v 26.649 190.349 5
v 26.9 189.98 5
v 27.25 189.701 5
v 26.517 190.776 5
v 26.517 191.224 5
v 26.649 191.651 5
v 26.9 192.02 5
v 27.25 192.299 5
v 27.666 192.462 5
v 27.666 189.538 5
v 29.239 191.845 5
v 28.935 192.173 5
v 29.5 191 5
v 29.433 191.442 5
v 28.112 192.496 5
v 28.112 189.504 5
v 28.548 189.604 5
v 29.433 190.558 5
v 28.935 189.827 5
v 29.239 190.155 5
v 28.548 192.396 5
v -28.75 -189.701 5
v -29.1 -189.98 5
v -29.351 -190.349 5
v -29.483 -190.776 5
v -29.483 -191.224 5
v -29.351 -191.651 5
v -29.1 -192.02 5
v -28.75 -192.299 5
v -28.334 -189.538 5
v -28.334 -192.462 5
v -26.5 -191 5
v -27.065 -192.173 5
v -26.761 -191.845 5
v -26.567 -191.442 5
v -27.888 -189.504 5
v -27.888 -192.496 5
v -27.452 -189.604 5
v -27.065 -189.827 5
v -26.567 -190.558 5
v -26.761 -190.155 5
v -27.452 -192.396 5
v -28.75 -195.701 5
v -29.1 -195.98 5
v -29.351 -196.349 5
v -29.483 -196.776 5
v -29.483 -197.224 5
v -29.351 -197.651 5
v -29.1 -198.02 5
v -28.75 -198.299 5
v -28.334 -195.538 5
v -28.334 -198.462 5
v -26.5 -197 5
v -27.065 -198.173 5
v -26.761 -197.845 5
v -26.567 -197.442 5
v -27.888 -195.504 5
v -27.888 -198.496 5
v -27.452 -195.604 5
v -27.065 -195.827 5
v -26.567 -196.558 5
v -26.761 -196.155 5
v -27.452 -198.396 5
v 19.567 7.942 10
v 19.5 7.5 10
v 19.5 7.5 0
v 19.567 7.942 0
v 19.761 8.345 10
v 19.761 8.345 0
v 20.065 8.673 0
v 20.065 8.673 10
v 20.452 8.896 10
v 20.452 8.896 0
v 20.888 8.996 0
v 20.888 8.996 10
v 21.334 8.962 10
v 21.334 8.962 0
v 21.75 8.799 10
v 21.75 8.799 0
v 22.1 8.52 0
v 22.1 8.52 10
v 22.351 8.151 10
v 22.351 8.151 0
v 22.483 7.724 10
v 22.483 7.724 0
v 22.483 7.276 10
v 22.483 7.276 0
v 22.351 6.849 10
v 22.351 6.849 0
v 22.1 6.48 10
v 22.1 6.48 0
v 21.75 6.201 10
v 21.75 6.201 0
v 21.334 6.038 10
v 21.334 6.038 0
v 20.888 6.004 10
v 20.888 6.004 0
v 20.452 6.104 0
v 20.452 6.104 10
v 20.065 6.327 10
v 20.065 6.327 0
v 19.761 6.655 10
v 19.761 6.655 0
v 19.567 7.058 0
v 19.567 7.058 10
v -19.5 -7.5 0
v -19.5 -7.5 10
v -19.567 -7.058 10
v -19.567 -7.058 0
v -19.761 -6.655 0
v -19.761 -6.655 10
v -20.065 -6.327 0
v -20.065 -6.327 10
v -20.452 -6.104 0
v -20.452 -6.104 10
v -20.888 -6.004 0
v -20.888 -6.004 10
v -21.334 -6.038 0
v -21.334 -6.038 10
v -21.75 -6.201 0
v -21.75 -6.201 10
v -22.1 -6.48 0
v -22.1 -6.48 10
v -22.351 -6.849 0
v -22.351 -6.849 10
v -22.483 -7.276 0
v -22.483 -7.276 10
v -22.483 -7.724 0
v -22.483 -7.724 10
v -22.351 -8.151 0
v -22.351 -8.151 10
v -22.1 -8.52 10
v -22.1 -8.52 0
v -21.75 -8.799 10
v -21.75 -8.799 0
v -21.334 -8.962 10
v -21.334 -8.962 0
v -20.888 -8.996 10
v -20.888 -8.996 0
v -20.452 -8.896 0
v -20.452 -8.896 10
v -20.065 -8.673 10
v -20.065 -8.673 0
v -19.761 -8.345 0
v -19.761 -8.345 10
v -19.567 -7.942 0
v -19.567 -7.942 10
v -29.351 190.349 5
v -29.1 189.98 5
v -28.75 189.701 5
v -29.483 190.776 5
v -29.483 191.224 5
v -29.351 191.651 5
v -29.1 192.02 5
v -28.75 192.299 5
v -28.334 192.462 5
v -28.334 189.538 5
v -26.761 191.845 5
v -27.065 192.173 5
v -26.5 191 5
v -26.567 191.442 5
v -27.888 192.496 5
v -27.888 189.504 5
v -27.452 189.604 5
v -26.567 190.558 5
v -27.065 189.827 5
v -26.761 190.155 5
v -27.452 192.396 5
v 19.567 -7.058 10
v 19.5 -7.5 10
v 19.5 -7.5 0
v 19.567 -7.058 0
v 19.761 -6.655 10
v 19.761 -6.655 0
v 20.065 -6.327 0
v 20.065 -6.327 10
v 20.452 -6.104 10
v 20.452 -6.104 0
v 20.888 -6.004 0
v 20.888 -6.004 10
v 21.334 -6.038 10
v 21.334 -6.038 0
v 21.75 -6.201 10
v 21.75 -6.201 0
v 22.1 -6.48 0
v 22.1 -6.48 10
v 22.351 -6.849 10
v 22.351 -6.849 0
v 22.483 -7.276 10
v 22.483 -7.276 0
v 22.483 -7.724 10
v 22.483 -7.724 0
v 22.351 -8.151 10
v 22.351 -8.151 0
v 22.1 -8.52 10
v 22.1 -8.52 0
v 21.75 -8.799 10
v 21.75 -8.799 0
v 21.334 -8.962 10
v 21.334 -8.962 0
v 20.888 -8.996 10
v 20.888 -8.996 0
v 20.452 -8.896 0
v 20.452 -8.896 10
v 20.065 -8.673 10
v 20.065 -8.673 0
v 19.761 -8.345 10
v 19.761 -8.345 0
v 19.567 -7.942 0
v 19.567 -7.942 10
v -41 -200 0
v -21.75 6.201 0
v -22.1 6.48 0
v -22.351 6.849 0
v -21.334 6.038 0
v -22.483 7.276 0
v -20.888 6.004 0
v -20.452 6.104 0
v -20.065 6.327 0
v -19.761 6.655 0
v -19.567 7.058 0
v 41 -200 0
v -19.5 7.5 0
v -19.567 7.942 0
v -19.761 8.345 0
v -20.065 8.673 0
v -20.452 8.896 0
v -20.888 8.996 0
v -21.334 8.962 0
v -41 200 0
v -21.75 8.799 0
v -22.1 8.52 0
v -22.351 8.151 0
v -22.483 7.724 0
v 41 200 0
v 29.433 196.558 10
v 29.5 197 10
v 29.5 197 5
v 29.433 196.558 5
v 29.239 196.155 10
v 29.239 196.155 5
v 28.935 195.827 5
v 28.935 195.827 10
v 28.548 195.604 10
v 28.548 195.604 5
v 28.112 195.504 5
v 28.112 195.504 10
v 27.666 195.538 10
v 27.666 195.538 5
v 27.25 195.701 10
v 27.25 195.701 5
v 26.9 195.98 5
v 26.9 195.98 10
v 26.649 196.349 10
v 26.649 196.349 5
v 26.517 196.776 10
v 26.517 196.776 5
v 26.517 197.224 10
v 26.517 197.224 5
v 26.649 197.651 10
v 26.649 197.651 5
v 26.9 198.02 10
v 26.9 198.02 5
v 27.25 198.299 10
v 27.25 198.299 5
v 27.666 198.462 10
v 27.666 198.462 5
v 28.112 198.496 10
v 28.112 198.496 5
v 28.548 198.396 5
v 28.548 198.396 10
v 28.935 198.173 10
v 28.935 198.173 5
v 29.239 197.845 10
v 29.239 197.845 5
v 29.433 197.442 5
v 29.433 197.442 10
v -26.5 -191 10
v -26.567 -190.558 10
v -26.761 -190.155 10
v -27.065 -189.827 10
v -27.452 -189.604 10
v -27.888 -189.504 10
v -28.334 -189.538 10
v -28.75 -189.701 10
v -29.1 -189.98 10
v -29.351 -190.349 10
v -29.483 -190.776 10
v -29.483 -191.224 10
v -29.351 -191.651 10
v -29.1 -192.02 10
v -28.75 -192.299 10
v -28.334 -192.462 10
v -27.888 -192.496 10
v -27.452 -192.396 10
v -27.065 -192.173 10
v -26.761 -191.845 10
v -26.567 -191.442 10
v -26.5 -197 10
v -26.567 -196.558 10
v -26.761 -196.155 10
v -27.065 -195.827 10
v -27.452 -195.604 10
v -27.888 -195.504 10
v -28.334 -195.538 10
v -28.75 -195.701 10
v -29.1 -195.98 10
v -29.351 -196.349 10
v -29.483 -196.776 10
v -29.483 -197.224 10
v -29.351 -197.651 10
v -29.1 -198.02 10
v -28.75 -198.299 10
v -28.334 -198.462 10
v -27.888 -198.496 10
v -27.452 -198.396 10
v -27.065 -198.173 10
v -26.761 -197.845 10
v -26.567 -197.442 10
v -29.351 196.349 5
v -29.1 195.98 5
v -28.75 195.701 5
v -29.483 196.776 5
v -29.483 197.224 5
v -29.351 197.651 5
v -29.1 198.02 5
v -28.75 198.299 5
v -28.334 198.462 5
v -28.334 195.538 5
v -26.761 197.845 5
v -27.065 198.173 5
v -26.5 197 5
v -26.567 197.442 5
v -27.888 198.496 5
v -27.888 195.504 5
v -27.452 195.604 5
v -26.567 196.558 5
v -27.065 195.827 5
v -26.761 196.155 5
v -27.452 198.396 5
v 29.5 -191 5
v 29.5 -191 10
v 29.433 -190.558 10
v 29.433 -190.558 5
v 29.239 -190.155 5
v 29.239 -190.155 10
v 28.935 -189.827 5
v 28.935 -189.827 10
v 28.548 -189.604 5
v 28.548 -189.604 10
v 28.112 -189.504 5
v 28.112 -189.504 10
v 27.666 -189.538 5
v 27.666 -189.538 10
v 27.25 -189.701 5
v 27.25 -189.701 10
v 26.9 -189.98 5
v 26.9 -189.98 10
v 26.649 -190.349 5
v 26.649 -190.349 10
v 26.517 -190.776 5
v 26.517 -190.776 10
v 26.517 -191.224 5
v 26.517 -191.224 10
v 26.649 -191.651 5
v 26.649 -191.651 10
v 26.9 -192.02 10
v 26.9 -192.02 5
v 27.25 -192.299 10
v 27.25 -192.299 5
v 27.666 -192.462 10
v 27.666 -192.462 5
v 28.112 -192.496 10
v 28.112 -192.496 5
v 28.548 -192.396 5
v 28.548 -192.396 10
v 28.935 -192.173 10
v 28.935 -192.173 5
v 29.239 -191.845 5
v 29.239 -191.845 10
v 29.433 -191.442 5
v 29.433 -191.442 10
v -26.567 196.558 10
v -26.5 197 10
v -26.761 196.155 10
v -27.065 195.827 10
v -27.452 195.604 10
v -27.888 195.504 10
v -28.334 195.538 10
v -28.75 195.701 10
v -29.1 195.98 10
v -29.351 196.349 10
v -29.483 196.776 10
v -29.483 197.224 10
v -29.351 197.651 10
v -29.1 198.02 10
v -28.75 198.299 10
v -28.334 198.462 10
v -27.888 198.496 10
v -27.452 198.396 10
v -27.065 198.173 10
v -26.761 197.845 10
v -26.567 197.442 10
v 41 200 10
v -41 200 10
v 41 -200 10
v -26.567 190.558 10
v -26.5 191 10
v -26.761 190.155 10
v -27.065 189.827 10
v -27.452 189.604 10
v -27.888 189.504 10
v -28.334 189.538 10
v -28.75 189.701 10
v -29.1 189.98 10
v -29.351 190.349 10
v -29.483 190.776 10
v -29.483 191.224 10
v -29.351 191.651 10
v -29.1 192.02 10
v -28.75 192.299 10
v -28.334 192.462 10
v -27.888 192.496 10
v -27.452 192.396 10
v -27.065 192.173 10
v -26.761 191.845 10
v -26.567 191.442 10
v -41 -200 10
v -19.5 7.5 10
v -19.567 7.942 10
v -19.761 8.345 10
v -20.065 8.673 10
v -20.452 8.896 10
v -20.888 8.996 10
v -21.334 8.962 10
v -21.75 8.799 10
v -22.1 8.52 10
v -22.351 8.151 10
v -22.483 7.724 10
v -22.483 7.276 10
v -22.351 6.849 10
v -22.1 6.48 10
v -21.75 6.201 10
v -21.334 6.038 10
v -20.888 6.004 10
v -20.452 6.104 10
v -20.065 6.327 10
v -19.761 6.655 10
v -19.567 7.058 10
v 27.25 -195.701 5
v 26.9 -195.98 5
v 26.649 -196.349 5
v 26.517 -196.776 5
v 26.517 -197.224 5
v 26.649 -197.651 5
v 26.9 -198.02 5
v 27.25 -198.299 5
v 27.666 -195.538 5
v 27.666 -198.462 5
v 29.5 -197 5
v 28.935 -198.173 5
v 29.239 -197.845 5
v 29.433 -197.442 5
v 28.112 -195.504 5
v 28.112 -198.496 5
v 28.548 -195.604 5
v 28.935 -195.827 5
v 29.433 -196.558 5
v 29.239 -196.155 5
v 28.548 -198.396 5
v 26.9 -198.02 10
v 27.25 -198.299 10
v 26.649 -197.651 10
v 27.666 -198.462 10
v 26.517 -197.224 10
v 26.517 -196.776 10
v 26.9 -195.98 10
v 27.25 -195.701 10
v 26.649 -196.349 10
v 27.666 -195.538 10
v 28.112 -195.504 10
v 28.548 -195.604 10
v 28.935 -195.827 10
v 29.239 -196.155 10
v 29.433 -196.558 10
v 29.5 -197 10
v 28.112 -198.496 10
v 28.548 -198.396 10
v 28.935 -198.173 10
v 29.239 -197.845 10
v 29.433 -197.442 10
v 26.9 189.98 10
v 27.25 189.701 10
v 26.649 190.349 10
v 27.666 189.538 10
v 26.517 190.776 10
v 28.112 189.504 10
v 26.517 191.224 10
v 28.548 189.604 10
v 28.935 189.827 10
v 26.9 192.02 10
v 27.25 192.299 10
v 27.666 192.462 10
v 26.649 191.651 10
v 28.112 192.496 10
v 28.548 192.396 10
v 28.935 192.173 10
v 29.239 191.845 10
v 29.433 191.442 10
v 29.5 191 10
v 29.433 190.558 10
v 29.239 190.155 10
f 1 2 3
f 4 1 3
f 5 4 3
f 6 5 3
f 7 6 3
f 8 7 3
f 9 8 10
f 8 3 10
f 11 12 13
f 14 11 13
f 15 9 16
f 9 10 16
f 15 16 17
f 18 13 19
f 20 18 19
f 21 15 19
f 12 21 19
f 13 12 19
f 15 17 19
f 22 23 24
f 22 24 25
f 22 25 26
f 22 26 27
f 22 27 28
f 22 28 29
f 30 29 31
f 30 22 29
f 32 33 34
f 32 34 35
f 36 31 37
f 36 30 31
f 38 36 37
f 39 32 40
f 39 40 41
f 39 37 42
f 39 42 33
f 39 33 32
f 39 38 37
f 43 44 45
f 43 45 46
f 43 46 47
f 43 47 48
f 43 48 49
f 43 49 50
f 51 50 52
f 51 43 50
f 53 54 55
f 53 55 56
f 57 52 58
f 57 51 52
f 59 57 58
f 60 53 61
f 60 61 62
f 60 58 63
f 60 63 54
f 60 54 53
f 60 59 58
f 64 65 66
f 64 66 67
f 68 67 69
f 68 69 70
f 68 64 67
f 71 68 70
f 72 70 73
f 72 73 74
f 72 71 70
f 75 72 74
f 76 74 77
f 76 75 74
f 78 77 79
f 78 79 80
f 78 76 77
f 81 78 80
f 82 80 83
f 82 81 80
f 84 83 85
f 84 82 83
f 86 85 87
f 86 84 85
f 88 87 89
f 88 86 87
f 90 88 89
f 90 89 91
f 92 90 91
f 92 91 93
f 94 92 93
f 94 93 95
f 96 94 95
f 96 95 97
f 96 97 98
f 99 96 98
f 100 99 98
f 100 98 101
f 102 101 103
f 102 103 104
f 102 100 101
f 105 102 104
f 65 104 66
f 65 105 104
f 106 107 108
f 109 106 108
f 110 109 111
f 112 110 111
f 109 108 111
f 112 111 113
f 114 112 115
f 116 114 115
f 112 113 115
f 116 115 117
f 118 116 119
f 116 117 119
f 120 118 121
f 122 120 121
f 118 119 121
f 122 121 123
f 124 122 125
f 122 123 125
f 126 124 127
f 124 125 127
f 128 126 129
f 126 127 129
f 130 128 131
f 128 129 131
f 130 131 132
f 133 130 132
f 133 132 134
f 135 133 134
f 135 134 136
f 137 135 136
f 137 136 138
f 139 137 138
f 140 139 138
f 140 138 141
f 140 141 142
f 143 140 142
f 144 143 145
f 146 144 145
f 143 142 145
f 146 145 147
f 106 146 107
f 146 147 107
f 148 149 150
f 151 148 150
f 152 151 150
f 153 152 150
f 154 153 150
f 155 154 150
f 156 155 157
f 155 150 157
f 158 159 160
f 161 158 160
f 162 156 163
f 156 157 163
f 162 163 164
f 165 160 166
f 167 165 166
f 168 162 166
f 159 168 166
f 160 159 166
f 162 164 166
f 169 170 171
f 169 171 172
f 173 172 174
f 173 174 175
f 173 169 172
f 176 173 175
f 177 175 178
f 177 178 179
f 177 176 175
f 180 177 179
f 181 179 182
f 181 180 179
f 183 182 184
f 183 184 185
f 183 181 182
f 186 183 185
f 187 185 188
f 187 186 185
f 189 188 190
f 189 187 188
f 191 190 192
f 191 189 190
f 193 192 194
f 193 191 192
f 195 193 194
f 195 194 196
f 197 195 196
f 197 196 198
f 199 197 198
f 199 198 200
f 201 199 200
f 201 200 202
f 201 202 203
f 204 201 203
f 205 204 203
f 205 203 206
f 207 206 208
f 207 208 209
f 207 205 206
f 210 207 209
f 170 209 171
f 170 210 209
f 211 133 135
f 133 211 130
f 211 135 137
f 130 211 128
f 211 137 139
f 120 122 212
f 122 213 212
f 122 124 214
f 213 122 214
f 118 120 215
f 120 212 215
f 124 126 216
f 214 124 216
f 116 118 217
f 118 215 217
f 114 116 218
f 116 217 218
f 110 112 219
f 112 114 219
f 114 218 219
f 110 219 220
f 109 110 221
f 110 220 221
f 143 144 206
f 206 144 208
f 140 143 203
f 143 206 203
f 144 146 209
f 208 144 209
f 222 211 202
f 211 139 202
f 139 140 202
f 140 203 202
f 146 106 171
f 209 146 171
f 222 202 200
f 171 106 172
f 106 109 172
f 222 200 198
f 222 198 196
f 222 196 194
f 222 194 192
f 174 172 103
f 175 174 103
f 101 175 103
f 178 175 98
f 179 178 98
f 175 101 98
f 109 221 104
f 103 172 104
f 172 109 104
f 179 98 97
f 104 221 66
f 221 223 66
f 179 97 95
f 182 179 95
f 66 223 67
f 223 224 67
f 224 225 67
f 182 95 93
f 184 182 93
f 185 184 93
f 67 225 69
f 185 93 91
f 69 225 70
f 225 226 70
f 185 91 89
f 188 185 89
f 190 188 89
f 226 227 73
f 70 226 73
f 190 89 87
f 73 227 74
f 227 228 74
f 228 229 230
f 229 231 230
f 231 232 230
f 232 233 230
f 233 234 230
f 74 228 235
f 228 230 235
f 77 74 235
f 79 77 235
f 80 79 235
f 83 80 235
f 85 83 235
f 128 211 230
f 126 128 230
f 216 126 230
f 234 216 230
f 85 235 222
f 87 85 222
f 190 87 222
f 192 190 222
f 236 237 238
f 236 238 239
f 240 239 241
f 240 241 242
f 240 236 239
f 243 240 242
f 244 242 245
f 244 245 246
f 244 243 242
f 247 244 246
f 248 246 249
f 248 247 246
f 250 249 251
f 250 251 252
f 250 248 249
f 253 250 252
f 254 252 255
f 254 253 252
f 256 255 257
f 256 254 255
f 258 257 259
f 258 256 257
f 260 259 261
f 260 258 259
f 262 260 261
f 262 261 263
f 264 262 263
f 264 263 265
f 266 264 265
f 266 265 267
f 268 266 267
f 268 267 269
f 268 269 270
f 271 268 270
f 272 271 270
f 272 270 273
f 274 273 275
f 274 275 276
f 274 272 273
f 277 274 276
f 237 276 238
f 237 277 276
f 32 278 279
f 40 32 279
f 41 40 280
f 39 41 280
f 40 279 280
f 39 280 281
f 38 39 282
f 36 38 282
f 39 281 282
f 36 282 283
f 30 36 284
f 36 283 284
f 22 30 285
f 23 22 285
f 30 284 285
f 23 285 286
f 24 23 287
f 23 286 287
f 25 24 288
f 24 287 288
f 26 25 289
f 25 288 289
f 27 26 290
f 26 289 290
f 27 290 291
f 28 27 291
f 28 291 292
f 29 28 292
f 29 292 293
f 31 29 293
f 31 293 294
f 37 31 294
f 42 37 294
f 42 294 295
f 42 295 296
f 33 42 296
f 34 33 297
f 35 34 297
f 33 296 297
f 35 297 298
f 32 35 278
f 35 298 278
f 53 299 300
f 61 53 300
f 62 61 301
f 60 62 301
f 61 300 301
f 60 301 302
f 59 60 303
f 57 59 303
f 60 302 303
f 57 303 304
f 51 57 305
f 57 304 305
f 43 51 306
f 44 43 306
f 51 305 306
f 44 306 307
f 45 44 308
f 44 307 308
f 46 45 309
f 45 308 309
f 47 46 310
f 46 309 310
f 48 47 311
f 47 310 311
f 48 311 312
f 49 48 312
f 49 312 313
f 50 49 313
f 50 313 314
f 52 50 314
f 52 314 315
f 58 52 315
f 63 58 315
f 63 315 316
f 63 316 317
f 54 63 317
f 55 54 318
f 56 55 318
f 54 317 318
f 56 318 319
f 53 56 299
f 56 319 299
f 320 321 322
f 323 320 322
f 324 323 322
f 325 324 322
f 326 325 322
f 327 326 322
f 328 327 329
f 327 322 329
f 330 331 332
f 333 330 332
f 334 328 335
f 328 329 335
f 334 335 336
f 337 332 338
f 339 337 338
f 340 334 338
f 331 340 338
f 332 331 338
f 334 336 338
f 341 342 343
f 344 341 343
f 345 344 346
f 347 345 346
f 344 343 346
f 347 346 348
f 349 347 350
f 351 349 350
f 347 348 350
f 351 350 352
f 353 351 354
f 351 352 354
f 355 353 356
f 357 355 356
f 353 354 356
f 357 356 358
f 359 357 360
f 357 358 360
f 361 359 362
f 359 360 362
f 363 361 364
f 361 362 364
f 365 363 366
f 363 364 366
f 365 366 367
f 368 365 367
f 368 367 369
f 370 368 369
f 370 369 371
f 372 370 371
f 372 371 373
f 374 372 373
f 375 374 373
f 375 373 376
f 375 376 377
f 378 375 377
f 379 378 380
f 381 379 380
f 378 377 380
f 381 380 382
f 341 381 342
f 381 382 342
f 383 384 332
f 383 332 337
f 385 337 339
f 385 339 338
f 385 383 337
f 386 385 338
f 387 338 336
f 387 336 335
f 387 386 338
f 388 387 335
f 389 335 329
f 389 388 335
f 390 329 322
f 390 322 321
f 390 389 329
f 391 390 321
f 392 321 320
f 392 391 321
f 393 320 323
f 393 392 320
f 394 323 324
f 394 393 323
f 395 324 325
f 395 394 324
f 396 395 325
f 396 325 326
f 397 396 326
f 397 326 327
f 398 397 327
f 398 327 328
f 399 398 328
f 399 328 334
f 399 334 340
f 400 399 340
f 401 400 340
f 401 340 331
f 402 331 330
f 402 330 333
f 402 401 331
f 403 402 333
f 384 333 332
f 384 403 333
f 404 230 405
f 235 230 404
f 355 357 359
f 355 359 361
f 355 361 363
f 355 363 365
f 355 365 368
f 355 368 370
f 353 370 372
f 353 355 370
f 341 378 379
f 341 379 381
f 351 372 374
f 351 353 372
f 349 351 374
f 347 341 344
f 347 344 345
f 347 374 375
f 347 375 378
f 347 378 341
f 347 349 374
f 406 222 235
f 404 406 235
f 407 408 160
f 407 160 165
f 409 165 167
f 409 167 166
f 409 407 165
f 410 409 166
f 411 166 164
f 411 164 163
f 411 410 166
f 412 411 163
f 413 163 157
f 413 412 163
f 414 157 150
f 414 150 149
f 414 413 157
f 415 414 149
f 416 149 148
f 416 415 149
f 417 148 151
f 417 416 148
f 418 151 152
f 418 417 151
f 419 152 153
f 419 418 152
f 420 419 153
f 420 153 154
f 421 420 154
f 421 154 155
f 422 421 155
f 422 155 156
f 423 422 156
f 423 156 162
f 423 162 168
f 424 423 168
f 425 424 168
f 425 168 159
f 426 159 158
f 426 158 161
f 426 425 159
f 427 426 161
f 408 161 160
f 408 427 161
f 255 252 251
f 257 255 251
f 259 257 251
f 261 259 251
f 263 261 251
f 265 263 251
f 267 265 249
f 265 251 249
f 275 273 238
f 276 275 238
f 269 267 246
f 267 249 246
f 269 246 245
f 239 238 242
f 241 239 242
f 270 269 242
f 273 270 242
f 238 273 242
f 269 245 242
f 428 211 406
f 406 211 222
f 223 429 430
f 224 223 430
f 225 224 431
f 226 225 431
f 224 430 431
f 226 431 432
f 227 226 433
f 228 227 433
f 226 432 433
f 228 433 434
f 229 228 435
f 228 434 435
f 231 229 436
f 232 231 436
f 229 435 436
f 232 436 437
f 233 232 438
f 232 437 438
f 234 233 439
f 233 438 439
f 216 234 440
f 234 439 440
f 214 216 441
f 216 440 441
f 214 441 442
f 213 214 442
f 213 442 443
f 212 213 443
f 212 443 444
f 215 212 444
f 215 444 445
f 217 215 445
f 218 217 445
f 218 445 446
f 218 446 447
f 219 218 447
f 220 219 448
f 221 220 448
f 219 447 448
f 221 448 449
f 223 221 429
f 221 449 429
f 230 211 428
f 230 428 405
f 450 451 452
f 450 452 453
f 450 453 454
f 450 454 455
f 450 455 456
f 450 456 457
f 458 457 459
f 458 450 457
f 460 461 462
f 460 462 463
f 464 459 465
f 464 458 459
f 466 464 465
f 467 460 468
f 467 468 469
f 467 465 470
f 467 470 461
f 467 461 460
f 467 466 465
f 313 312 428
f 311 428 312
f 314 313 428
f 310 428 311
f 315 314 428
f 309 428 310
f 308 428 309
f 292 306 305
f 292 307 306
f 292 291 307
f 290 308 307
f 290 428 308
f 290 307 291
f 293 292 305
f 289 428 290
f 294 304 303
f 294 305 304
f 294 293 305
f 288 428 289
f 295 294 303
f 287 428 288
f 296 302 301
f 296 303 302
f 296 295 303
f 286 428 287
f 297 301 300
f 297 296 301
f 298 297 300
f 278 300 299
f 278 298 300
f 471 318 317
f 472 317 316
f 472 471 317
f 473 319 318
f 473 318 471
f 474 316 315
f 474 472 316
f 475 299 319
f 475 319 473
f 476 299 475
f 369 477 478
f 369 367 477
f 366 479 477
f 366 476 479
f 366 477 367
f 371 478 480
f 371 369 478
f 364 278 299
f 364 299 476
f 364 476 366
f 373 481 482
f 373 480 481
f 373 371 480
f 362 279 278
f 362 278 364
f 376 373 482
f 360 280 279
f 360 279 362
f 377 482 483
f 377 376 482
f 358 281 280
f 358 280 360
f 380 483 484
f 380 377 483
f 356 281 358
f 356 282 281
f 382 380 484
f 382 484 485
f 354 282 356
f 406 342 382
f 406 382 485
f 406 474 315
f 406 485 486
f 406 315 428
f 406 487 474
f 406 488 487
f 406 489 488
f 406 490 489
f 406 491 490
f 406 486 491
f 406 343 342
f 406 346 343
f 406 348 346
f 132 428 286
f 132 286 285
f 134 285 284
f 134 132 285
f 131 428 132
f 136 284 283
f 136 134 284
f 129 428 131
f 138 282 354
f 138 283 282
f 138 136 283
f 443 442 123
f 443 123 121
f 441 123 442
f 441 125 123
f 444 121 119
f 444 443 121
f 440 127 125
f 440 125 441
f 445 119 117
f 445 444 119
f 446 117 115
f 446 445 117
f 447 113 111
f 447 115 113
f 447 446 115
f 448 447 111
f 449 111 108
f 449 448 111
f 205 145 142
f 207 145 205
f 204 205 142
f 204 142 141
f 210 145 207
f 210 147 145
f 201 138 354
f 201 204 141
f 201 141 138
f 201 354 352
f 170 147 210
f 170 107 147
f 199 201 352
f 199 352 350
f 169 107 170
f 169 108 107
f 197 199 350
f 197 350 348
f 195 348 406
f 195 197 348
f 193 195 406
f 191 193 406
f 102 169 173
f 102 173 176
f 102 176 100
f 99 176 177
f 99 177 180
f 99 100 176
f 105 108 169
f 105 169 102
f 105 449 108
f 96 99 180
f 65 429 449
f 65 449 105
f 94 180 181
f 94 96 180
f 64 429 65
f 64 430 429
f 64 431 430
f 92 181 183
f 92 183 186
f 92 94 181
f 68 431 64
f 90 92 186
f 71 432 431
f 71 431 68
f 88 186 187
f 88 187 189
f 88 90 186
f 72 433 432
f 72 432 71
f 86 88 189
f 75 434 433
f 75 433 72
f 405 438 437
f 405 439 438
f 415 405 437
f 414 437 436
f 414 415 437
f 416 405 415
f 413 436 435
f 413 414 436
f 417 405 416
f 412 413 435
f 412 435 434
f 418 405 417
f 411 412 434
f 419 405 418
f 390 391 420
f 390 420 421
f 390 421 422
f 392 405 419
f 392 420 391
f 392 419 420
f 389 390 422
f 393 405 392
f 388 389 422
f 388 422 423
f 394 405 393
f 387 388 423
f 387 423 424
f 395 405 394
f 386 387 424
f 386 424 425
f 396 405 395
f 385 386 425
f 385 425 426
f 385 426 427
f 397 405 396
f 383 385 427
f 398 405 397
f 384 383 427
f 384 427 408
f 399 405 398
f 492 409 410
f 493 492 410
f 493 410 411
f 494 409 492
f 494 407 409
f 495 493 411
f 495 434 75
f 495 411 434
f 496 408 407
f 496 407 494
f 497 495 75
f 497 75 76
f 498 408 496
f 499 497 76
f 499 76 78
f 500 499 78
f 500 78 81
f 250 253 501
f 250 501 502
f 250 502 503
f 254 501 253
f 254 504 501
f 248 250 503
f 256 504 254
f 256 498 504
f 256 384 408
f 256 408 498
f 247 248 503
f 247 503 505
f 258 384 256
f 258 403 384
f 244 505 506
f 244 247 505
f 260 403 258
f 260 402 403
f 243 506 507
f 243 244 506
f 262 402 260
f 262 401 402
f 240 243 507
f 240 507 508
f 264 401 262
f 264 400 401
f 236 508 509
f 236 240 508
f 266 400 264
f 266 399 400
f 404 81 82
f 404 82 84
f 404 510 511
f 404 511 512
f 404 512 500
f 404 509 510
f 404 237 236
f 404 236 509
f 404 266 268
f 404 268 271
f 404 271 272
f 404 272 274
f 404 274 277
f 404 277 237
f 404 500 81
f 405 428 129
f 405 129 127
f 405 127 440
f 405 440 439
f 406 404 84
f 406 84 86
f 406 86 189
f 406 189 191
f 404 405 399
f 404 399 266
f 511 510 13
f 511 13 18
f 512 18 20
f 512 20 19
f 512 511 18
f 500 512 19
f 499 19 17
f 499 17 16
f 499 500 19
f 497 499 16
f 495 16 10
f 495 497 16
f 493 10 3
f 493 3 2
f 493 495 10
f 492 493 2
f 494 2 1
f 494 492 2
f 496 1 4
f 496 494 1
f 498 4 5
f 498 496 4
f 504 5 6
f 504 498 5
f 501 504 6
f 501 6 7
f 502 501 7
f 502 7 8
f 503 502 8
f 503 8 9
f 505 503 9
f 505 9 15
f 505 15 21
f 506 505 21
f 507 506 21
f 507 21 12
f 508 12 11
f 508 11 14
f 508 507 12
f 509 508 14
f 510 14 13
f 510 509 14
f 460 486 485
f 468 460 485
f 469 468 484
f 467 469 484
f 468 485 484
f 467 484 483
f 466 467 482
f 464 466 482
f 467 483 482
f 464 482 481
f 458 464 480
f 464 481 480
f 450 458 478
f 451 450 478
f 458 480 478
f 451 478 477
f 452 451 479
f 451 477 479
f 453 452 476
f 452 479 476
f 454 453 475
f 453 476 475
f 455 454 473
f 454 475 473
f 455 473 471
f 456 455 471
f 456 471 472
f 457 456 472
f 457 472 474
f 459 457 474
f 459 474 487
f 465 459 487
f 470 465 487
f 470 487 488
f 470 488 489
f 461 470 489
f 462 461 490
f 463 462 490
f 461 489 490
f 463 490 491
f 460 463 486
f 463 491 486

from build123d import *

# Parameters (mm, degrees)
SKETCH_1_W          = 82
SKETCH_1_H          = 400
EXTRUDE_1_DEPTH     = 10
SKETCH_4_R          = 1.5
CUT_EXTRUDE_1_DEPTH = 5
SKETCH_5_R          = 1.5
CUT_EXTRUDE_2_DEPTH = 10


with BuildPart() as part:
    # 草图1 → 凸台-拉伸1 (new body)
    with BuildSketch(Plane.XY):
        Rectangle(SKETCH_1_W, SKETCH_1_H)
    extrude(amount=EXTRUDE_1_DEPTH)

    # 草图4 → 切除-拉伸1 (cut)
    with BuildSketch(Plane.XY.offset(10)):
        with Locations((28, -197)):
            Circle(SKETCH_4_R)
        with Locations((28, -191)):
            Circle(SKETCH_4_R)
        with Locations((-28, -197)):
            Circle(SKETCH_4_R)
        with Locations((-28, -191)):
            Circle(SKETCH_4_R)
    cut_extrude_1 = extrude(amount=-CUT_EXTRUDE_1_DEPTH, mode=Mode.SUBTRACT)

    # 镜向1: 切除-拉伸1 across plane
    add(cut_extrude_1.mirror(Plane.ZX), mode=Mode.SUBTRACT)

    # 草图5 → 切除-拉伸2 (cut)
    with BuildSketch(Plane.XY.offset(10)):
        with Locations((-21, 7.5)):
            Circle(SKETCH_5_R)
        with Locations((-21, -7.5)):
            Circle(SKETCH_5_R)
    cut_extrude_2 = extrude(amount=-CUT_EXTRUDE_2_DEPTH, mode=Mode.SUBTRACT)

    # 镜向2: 切除-拉伸2 across plane
    add(cut_extrude_2.mirror(Plane(origin=(0, 0, 0), x_dir=(0, 0, 1), z_dir=(1, 0, 0))), mode=Mode.SUBTRACT)


solid = part.part
